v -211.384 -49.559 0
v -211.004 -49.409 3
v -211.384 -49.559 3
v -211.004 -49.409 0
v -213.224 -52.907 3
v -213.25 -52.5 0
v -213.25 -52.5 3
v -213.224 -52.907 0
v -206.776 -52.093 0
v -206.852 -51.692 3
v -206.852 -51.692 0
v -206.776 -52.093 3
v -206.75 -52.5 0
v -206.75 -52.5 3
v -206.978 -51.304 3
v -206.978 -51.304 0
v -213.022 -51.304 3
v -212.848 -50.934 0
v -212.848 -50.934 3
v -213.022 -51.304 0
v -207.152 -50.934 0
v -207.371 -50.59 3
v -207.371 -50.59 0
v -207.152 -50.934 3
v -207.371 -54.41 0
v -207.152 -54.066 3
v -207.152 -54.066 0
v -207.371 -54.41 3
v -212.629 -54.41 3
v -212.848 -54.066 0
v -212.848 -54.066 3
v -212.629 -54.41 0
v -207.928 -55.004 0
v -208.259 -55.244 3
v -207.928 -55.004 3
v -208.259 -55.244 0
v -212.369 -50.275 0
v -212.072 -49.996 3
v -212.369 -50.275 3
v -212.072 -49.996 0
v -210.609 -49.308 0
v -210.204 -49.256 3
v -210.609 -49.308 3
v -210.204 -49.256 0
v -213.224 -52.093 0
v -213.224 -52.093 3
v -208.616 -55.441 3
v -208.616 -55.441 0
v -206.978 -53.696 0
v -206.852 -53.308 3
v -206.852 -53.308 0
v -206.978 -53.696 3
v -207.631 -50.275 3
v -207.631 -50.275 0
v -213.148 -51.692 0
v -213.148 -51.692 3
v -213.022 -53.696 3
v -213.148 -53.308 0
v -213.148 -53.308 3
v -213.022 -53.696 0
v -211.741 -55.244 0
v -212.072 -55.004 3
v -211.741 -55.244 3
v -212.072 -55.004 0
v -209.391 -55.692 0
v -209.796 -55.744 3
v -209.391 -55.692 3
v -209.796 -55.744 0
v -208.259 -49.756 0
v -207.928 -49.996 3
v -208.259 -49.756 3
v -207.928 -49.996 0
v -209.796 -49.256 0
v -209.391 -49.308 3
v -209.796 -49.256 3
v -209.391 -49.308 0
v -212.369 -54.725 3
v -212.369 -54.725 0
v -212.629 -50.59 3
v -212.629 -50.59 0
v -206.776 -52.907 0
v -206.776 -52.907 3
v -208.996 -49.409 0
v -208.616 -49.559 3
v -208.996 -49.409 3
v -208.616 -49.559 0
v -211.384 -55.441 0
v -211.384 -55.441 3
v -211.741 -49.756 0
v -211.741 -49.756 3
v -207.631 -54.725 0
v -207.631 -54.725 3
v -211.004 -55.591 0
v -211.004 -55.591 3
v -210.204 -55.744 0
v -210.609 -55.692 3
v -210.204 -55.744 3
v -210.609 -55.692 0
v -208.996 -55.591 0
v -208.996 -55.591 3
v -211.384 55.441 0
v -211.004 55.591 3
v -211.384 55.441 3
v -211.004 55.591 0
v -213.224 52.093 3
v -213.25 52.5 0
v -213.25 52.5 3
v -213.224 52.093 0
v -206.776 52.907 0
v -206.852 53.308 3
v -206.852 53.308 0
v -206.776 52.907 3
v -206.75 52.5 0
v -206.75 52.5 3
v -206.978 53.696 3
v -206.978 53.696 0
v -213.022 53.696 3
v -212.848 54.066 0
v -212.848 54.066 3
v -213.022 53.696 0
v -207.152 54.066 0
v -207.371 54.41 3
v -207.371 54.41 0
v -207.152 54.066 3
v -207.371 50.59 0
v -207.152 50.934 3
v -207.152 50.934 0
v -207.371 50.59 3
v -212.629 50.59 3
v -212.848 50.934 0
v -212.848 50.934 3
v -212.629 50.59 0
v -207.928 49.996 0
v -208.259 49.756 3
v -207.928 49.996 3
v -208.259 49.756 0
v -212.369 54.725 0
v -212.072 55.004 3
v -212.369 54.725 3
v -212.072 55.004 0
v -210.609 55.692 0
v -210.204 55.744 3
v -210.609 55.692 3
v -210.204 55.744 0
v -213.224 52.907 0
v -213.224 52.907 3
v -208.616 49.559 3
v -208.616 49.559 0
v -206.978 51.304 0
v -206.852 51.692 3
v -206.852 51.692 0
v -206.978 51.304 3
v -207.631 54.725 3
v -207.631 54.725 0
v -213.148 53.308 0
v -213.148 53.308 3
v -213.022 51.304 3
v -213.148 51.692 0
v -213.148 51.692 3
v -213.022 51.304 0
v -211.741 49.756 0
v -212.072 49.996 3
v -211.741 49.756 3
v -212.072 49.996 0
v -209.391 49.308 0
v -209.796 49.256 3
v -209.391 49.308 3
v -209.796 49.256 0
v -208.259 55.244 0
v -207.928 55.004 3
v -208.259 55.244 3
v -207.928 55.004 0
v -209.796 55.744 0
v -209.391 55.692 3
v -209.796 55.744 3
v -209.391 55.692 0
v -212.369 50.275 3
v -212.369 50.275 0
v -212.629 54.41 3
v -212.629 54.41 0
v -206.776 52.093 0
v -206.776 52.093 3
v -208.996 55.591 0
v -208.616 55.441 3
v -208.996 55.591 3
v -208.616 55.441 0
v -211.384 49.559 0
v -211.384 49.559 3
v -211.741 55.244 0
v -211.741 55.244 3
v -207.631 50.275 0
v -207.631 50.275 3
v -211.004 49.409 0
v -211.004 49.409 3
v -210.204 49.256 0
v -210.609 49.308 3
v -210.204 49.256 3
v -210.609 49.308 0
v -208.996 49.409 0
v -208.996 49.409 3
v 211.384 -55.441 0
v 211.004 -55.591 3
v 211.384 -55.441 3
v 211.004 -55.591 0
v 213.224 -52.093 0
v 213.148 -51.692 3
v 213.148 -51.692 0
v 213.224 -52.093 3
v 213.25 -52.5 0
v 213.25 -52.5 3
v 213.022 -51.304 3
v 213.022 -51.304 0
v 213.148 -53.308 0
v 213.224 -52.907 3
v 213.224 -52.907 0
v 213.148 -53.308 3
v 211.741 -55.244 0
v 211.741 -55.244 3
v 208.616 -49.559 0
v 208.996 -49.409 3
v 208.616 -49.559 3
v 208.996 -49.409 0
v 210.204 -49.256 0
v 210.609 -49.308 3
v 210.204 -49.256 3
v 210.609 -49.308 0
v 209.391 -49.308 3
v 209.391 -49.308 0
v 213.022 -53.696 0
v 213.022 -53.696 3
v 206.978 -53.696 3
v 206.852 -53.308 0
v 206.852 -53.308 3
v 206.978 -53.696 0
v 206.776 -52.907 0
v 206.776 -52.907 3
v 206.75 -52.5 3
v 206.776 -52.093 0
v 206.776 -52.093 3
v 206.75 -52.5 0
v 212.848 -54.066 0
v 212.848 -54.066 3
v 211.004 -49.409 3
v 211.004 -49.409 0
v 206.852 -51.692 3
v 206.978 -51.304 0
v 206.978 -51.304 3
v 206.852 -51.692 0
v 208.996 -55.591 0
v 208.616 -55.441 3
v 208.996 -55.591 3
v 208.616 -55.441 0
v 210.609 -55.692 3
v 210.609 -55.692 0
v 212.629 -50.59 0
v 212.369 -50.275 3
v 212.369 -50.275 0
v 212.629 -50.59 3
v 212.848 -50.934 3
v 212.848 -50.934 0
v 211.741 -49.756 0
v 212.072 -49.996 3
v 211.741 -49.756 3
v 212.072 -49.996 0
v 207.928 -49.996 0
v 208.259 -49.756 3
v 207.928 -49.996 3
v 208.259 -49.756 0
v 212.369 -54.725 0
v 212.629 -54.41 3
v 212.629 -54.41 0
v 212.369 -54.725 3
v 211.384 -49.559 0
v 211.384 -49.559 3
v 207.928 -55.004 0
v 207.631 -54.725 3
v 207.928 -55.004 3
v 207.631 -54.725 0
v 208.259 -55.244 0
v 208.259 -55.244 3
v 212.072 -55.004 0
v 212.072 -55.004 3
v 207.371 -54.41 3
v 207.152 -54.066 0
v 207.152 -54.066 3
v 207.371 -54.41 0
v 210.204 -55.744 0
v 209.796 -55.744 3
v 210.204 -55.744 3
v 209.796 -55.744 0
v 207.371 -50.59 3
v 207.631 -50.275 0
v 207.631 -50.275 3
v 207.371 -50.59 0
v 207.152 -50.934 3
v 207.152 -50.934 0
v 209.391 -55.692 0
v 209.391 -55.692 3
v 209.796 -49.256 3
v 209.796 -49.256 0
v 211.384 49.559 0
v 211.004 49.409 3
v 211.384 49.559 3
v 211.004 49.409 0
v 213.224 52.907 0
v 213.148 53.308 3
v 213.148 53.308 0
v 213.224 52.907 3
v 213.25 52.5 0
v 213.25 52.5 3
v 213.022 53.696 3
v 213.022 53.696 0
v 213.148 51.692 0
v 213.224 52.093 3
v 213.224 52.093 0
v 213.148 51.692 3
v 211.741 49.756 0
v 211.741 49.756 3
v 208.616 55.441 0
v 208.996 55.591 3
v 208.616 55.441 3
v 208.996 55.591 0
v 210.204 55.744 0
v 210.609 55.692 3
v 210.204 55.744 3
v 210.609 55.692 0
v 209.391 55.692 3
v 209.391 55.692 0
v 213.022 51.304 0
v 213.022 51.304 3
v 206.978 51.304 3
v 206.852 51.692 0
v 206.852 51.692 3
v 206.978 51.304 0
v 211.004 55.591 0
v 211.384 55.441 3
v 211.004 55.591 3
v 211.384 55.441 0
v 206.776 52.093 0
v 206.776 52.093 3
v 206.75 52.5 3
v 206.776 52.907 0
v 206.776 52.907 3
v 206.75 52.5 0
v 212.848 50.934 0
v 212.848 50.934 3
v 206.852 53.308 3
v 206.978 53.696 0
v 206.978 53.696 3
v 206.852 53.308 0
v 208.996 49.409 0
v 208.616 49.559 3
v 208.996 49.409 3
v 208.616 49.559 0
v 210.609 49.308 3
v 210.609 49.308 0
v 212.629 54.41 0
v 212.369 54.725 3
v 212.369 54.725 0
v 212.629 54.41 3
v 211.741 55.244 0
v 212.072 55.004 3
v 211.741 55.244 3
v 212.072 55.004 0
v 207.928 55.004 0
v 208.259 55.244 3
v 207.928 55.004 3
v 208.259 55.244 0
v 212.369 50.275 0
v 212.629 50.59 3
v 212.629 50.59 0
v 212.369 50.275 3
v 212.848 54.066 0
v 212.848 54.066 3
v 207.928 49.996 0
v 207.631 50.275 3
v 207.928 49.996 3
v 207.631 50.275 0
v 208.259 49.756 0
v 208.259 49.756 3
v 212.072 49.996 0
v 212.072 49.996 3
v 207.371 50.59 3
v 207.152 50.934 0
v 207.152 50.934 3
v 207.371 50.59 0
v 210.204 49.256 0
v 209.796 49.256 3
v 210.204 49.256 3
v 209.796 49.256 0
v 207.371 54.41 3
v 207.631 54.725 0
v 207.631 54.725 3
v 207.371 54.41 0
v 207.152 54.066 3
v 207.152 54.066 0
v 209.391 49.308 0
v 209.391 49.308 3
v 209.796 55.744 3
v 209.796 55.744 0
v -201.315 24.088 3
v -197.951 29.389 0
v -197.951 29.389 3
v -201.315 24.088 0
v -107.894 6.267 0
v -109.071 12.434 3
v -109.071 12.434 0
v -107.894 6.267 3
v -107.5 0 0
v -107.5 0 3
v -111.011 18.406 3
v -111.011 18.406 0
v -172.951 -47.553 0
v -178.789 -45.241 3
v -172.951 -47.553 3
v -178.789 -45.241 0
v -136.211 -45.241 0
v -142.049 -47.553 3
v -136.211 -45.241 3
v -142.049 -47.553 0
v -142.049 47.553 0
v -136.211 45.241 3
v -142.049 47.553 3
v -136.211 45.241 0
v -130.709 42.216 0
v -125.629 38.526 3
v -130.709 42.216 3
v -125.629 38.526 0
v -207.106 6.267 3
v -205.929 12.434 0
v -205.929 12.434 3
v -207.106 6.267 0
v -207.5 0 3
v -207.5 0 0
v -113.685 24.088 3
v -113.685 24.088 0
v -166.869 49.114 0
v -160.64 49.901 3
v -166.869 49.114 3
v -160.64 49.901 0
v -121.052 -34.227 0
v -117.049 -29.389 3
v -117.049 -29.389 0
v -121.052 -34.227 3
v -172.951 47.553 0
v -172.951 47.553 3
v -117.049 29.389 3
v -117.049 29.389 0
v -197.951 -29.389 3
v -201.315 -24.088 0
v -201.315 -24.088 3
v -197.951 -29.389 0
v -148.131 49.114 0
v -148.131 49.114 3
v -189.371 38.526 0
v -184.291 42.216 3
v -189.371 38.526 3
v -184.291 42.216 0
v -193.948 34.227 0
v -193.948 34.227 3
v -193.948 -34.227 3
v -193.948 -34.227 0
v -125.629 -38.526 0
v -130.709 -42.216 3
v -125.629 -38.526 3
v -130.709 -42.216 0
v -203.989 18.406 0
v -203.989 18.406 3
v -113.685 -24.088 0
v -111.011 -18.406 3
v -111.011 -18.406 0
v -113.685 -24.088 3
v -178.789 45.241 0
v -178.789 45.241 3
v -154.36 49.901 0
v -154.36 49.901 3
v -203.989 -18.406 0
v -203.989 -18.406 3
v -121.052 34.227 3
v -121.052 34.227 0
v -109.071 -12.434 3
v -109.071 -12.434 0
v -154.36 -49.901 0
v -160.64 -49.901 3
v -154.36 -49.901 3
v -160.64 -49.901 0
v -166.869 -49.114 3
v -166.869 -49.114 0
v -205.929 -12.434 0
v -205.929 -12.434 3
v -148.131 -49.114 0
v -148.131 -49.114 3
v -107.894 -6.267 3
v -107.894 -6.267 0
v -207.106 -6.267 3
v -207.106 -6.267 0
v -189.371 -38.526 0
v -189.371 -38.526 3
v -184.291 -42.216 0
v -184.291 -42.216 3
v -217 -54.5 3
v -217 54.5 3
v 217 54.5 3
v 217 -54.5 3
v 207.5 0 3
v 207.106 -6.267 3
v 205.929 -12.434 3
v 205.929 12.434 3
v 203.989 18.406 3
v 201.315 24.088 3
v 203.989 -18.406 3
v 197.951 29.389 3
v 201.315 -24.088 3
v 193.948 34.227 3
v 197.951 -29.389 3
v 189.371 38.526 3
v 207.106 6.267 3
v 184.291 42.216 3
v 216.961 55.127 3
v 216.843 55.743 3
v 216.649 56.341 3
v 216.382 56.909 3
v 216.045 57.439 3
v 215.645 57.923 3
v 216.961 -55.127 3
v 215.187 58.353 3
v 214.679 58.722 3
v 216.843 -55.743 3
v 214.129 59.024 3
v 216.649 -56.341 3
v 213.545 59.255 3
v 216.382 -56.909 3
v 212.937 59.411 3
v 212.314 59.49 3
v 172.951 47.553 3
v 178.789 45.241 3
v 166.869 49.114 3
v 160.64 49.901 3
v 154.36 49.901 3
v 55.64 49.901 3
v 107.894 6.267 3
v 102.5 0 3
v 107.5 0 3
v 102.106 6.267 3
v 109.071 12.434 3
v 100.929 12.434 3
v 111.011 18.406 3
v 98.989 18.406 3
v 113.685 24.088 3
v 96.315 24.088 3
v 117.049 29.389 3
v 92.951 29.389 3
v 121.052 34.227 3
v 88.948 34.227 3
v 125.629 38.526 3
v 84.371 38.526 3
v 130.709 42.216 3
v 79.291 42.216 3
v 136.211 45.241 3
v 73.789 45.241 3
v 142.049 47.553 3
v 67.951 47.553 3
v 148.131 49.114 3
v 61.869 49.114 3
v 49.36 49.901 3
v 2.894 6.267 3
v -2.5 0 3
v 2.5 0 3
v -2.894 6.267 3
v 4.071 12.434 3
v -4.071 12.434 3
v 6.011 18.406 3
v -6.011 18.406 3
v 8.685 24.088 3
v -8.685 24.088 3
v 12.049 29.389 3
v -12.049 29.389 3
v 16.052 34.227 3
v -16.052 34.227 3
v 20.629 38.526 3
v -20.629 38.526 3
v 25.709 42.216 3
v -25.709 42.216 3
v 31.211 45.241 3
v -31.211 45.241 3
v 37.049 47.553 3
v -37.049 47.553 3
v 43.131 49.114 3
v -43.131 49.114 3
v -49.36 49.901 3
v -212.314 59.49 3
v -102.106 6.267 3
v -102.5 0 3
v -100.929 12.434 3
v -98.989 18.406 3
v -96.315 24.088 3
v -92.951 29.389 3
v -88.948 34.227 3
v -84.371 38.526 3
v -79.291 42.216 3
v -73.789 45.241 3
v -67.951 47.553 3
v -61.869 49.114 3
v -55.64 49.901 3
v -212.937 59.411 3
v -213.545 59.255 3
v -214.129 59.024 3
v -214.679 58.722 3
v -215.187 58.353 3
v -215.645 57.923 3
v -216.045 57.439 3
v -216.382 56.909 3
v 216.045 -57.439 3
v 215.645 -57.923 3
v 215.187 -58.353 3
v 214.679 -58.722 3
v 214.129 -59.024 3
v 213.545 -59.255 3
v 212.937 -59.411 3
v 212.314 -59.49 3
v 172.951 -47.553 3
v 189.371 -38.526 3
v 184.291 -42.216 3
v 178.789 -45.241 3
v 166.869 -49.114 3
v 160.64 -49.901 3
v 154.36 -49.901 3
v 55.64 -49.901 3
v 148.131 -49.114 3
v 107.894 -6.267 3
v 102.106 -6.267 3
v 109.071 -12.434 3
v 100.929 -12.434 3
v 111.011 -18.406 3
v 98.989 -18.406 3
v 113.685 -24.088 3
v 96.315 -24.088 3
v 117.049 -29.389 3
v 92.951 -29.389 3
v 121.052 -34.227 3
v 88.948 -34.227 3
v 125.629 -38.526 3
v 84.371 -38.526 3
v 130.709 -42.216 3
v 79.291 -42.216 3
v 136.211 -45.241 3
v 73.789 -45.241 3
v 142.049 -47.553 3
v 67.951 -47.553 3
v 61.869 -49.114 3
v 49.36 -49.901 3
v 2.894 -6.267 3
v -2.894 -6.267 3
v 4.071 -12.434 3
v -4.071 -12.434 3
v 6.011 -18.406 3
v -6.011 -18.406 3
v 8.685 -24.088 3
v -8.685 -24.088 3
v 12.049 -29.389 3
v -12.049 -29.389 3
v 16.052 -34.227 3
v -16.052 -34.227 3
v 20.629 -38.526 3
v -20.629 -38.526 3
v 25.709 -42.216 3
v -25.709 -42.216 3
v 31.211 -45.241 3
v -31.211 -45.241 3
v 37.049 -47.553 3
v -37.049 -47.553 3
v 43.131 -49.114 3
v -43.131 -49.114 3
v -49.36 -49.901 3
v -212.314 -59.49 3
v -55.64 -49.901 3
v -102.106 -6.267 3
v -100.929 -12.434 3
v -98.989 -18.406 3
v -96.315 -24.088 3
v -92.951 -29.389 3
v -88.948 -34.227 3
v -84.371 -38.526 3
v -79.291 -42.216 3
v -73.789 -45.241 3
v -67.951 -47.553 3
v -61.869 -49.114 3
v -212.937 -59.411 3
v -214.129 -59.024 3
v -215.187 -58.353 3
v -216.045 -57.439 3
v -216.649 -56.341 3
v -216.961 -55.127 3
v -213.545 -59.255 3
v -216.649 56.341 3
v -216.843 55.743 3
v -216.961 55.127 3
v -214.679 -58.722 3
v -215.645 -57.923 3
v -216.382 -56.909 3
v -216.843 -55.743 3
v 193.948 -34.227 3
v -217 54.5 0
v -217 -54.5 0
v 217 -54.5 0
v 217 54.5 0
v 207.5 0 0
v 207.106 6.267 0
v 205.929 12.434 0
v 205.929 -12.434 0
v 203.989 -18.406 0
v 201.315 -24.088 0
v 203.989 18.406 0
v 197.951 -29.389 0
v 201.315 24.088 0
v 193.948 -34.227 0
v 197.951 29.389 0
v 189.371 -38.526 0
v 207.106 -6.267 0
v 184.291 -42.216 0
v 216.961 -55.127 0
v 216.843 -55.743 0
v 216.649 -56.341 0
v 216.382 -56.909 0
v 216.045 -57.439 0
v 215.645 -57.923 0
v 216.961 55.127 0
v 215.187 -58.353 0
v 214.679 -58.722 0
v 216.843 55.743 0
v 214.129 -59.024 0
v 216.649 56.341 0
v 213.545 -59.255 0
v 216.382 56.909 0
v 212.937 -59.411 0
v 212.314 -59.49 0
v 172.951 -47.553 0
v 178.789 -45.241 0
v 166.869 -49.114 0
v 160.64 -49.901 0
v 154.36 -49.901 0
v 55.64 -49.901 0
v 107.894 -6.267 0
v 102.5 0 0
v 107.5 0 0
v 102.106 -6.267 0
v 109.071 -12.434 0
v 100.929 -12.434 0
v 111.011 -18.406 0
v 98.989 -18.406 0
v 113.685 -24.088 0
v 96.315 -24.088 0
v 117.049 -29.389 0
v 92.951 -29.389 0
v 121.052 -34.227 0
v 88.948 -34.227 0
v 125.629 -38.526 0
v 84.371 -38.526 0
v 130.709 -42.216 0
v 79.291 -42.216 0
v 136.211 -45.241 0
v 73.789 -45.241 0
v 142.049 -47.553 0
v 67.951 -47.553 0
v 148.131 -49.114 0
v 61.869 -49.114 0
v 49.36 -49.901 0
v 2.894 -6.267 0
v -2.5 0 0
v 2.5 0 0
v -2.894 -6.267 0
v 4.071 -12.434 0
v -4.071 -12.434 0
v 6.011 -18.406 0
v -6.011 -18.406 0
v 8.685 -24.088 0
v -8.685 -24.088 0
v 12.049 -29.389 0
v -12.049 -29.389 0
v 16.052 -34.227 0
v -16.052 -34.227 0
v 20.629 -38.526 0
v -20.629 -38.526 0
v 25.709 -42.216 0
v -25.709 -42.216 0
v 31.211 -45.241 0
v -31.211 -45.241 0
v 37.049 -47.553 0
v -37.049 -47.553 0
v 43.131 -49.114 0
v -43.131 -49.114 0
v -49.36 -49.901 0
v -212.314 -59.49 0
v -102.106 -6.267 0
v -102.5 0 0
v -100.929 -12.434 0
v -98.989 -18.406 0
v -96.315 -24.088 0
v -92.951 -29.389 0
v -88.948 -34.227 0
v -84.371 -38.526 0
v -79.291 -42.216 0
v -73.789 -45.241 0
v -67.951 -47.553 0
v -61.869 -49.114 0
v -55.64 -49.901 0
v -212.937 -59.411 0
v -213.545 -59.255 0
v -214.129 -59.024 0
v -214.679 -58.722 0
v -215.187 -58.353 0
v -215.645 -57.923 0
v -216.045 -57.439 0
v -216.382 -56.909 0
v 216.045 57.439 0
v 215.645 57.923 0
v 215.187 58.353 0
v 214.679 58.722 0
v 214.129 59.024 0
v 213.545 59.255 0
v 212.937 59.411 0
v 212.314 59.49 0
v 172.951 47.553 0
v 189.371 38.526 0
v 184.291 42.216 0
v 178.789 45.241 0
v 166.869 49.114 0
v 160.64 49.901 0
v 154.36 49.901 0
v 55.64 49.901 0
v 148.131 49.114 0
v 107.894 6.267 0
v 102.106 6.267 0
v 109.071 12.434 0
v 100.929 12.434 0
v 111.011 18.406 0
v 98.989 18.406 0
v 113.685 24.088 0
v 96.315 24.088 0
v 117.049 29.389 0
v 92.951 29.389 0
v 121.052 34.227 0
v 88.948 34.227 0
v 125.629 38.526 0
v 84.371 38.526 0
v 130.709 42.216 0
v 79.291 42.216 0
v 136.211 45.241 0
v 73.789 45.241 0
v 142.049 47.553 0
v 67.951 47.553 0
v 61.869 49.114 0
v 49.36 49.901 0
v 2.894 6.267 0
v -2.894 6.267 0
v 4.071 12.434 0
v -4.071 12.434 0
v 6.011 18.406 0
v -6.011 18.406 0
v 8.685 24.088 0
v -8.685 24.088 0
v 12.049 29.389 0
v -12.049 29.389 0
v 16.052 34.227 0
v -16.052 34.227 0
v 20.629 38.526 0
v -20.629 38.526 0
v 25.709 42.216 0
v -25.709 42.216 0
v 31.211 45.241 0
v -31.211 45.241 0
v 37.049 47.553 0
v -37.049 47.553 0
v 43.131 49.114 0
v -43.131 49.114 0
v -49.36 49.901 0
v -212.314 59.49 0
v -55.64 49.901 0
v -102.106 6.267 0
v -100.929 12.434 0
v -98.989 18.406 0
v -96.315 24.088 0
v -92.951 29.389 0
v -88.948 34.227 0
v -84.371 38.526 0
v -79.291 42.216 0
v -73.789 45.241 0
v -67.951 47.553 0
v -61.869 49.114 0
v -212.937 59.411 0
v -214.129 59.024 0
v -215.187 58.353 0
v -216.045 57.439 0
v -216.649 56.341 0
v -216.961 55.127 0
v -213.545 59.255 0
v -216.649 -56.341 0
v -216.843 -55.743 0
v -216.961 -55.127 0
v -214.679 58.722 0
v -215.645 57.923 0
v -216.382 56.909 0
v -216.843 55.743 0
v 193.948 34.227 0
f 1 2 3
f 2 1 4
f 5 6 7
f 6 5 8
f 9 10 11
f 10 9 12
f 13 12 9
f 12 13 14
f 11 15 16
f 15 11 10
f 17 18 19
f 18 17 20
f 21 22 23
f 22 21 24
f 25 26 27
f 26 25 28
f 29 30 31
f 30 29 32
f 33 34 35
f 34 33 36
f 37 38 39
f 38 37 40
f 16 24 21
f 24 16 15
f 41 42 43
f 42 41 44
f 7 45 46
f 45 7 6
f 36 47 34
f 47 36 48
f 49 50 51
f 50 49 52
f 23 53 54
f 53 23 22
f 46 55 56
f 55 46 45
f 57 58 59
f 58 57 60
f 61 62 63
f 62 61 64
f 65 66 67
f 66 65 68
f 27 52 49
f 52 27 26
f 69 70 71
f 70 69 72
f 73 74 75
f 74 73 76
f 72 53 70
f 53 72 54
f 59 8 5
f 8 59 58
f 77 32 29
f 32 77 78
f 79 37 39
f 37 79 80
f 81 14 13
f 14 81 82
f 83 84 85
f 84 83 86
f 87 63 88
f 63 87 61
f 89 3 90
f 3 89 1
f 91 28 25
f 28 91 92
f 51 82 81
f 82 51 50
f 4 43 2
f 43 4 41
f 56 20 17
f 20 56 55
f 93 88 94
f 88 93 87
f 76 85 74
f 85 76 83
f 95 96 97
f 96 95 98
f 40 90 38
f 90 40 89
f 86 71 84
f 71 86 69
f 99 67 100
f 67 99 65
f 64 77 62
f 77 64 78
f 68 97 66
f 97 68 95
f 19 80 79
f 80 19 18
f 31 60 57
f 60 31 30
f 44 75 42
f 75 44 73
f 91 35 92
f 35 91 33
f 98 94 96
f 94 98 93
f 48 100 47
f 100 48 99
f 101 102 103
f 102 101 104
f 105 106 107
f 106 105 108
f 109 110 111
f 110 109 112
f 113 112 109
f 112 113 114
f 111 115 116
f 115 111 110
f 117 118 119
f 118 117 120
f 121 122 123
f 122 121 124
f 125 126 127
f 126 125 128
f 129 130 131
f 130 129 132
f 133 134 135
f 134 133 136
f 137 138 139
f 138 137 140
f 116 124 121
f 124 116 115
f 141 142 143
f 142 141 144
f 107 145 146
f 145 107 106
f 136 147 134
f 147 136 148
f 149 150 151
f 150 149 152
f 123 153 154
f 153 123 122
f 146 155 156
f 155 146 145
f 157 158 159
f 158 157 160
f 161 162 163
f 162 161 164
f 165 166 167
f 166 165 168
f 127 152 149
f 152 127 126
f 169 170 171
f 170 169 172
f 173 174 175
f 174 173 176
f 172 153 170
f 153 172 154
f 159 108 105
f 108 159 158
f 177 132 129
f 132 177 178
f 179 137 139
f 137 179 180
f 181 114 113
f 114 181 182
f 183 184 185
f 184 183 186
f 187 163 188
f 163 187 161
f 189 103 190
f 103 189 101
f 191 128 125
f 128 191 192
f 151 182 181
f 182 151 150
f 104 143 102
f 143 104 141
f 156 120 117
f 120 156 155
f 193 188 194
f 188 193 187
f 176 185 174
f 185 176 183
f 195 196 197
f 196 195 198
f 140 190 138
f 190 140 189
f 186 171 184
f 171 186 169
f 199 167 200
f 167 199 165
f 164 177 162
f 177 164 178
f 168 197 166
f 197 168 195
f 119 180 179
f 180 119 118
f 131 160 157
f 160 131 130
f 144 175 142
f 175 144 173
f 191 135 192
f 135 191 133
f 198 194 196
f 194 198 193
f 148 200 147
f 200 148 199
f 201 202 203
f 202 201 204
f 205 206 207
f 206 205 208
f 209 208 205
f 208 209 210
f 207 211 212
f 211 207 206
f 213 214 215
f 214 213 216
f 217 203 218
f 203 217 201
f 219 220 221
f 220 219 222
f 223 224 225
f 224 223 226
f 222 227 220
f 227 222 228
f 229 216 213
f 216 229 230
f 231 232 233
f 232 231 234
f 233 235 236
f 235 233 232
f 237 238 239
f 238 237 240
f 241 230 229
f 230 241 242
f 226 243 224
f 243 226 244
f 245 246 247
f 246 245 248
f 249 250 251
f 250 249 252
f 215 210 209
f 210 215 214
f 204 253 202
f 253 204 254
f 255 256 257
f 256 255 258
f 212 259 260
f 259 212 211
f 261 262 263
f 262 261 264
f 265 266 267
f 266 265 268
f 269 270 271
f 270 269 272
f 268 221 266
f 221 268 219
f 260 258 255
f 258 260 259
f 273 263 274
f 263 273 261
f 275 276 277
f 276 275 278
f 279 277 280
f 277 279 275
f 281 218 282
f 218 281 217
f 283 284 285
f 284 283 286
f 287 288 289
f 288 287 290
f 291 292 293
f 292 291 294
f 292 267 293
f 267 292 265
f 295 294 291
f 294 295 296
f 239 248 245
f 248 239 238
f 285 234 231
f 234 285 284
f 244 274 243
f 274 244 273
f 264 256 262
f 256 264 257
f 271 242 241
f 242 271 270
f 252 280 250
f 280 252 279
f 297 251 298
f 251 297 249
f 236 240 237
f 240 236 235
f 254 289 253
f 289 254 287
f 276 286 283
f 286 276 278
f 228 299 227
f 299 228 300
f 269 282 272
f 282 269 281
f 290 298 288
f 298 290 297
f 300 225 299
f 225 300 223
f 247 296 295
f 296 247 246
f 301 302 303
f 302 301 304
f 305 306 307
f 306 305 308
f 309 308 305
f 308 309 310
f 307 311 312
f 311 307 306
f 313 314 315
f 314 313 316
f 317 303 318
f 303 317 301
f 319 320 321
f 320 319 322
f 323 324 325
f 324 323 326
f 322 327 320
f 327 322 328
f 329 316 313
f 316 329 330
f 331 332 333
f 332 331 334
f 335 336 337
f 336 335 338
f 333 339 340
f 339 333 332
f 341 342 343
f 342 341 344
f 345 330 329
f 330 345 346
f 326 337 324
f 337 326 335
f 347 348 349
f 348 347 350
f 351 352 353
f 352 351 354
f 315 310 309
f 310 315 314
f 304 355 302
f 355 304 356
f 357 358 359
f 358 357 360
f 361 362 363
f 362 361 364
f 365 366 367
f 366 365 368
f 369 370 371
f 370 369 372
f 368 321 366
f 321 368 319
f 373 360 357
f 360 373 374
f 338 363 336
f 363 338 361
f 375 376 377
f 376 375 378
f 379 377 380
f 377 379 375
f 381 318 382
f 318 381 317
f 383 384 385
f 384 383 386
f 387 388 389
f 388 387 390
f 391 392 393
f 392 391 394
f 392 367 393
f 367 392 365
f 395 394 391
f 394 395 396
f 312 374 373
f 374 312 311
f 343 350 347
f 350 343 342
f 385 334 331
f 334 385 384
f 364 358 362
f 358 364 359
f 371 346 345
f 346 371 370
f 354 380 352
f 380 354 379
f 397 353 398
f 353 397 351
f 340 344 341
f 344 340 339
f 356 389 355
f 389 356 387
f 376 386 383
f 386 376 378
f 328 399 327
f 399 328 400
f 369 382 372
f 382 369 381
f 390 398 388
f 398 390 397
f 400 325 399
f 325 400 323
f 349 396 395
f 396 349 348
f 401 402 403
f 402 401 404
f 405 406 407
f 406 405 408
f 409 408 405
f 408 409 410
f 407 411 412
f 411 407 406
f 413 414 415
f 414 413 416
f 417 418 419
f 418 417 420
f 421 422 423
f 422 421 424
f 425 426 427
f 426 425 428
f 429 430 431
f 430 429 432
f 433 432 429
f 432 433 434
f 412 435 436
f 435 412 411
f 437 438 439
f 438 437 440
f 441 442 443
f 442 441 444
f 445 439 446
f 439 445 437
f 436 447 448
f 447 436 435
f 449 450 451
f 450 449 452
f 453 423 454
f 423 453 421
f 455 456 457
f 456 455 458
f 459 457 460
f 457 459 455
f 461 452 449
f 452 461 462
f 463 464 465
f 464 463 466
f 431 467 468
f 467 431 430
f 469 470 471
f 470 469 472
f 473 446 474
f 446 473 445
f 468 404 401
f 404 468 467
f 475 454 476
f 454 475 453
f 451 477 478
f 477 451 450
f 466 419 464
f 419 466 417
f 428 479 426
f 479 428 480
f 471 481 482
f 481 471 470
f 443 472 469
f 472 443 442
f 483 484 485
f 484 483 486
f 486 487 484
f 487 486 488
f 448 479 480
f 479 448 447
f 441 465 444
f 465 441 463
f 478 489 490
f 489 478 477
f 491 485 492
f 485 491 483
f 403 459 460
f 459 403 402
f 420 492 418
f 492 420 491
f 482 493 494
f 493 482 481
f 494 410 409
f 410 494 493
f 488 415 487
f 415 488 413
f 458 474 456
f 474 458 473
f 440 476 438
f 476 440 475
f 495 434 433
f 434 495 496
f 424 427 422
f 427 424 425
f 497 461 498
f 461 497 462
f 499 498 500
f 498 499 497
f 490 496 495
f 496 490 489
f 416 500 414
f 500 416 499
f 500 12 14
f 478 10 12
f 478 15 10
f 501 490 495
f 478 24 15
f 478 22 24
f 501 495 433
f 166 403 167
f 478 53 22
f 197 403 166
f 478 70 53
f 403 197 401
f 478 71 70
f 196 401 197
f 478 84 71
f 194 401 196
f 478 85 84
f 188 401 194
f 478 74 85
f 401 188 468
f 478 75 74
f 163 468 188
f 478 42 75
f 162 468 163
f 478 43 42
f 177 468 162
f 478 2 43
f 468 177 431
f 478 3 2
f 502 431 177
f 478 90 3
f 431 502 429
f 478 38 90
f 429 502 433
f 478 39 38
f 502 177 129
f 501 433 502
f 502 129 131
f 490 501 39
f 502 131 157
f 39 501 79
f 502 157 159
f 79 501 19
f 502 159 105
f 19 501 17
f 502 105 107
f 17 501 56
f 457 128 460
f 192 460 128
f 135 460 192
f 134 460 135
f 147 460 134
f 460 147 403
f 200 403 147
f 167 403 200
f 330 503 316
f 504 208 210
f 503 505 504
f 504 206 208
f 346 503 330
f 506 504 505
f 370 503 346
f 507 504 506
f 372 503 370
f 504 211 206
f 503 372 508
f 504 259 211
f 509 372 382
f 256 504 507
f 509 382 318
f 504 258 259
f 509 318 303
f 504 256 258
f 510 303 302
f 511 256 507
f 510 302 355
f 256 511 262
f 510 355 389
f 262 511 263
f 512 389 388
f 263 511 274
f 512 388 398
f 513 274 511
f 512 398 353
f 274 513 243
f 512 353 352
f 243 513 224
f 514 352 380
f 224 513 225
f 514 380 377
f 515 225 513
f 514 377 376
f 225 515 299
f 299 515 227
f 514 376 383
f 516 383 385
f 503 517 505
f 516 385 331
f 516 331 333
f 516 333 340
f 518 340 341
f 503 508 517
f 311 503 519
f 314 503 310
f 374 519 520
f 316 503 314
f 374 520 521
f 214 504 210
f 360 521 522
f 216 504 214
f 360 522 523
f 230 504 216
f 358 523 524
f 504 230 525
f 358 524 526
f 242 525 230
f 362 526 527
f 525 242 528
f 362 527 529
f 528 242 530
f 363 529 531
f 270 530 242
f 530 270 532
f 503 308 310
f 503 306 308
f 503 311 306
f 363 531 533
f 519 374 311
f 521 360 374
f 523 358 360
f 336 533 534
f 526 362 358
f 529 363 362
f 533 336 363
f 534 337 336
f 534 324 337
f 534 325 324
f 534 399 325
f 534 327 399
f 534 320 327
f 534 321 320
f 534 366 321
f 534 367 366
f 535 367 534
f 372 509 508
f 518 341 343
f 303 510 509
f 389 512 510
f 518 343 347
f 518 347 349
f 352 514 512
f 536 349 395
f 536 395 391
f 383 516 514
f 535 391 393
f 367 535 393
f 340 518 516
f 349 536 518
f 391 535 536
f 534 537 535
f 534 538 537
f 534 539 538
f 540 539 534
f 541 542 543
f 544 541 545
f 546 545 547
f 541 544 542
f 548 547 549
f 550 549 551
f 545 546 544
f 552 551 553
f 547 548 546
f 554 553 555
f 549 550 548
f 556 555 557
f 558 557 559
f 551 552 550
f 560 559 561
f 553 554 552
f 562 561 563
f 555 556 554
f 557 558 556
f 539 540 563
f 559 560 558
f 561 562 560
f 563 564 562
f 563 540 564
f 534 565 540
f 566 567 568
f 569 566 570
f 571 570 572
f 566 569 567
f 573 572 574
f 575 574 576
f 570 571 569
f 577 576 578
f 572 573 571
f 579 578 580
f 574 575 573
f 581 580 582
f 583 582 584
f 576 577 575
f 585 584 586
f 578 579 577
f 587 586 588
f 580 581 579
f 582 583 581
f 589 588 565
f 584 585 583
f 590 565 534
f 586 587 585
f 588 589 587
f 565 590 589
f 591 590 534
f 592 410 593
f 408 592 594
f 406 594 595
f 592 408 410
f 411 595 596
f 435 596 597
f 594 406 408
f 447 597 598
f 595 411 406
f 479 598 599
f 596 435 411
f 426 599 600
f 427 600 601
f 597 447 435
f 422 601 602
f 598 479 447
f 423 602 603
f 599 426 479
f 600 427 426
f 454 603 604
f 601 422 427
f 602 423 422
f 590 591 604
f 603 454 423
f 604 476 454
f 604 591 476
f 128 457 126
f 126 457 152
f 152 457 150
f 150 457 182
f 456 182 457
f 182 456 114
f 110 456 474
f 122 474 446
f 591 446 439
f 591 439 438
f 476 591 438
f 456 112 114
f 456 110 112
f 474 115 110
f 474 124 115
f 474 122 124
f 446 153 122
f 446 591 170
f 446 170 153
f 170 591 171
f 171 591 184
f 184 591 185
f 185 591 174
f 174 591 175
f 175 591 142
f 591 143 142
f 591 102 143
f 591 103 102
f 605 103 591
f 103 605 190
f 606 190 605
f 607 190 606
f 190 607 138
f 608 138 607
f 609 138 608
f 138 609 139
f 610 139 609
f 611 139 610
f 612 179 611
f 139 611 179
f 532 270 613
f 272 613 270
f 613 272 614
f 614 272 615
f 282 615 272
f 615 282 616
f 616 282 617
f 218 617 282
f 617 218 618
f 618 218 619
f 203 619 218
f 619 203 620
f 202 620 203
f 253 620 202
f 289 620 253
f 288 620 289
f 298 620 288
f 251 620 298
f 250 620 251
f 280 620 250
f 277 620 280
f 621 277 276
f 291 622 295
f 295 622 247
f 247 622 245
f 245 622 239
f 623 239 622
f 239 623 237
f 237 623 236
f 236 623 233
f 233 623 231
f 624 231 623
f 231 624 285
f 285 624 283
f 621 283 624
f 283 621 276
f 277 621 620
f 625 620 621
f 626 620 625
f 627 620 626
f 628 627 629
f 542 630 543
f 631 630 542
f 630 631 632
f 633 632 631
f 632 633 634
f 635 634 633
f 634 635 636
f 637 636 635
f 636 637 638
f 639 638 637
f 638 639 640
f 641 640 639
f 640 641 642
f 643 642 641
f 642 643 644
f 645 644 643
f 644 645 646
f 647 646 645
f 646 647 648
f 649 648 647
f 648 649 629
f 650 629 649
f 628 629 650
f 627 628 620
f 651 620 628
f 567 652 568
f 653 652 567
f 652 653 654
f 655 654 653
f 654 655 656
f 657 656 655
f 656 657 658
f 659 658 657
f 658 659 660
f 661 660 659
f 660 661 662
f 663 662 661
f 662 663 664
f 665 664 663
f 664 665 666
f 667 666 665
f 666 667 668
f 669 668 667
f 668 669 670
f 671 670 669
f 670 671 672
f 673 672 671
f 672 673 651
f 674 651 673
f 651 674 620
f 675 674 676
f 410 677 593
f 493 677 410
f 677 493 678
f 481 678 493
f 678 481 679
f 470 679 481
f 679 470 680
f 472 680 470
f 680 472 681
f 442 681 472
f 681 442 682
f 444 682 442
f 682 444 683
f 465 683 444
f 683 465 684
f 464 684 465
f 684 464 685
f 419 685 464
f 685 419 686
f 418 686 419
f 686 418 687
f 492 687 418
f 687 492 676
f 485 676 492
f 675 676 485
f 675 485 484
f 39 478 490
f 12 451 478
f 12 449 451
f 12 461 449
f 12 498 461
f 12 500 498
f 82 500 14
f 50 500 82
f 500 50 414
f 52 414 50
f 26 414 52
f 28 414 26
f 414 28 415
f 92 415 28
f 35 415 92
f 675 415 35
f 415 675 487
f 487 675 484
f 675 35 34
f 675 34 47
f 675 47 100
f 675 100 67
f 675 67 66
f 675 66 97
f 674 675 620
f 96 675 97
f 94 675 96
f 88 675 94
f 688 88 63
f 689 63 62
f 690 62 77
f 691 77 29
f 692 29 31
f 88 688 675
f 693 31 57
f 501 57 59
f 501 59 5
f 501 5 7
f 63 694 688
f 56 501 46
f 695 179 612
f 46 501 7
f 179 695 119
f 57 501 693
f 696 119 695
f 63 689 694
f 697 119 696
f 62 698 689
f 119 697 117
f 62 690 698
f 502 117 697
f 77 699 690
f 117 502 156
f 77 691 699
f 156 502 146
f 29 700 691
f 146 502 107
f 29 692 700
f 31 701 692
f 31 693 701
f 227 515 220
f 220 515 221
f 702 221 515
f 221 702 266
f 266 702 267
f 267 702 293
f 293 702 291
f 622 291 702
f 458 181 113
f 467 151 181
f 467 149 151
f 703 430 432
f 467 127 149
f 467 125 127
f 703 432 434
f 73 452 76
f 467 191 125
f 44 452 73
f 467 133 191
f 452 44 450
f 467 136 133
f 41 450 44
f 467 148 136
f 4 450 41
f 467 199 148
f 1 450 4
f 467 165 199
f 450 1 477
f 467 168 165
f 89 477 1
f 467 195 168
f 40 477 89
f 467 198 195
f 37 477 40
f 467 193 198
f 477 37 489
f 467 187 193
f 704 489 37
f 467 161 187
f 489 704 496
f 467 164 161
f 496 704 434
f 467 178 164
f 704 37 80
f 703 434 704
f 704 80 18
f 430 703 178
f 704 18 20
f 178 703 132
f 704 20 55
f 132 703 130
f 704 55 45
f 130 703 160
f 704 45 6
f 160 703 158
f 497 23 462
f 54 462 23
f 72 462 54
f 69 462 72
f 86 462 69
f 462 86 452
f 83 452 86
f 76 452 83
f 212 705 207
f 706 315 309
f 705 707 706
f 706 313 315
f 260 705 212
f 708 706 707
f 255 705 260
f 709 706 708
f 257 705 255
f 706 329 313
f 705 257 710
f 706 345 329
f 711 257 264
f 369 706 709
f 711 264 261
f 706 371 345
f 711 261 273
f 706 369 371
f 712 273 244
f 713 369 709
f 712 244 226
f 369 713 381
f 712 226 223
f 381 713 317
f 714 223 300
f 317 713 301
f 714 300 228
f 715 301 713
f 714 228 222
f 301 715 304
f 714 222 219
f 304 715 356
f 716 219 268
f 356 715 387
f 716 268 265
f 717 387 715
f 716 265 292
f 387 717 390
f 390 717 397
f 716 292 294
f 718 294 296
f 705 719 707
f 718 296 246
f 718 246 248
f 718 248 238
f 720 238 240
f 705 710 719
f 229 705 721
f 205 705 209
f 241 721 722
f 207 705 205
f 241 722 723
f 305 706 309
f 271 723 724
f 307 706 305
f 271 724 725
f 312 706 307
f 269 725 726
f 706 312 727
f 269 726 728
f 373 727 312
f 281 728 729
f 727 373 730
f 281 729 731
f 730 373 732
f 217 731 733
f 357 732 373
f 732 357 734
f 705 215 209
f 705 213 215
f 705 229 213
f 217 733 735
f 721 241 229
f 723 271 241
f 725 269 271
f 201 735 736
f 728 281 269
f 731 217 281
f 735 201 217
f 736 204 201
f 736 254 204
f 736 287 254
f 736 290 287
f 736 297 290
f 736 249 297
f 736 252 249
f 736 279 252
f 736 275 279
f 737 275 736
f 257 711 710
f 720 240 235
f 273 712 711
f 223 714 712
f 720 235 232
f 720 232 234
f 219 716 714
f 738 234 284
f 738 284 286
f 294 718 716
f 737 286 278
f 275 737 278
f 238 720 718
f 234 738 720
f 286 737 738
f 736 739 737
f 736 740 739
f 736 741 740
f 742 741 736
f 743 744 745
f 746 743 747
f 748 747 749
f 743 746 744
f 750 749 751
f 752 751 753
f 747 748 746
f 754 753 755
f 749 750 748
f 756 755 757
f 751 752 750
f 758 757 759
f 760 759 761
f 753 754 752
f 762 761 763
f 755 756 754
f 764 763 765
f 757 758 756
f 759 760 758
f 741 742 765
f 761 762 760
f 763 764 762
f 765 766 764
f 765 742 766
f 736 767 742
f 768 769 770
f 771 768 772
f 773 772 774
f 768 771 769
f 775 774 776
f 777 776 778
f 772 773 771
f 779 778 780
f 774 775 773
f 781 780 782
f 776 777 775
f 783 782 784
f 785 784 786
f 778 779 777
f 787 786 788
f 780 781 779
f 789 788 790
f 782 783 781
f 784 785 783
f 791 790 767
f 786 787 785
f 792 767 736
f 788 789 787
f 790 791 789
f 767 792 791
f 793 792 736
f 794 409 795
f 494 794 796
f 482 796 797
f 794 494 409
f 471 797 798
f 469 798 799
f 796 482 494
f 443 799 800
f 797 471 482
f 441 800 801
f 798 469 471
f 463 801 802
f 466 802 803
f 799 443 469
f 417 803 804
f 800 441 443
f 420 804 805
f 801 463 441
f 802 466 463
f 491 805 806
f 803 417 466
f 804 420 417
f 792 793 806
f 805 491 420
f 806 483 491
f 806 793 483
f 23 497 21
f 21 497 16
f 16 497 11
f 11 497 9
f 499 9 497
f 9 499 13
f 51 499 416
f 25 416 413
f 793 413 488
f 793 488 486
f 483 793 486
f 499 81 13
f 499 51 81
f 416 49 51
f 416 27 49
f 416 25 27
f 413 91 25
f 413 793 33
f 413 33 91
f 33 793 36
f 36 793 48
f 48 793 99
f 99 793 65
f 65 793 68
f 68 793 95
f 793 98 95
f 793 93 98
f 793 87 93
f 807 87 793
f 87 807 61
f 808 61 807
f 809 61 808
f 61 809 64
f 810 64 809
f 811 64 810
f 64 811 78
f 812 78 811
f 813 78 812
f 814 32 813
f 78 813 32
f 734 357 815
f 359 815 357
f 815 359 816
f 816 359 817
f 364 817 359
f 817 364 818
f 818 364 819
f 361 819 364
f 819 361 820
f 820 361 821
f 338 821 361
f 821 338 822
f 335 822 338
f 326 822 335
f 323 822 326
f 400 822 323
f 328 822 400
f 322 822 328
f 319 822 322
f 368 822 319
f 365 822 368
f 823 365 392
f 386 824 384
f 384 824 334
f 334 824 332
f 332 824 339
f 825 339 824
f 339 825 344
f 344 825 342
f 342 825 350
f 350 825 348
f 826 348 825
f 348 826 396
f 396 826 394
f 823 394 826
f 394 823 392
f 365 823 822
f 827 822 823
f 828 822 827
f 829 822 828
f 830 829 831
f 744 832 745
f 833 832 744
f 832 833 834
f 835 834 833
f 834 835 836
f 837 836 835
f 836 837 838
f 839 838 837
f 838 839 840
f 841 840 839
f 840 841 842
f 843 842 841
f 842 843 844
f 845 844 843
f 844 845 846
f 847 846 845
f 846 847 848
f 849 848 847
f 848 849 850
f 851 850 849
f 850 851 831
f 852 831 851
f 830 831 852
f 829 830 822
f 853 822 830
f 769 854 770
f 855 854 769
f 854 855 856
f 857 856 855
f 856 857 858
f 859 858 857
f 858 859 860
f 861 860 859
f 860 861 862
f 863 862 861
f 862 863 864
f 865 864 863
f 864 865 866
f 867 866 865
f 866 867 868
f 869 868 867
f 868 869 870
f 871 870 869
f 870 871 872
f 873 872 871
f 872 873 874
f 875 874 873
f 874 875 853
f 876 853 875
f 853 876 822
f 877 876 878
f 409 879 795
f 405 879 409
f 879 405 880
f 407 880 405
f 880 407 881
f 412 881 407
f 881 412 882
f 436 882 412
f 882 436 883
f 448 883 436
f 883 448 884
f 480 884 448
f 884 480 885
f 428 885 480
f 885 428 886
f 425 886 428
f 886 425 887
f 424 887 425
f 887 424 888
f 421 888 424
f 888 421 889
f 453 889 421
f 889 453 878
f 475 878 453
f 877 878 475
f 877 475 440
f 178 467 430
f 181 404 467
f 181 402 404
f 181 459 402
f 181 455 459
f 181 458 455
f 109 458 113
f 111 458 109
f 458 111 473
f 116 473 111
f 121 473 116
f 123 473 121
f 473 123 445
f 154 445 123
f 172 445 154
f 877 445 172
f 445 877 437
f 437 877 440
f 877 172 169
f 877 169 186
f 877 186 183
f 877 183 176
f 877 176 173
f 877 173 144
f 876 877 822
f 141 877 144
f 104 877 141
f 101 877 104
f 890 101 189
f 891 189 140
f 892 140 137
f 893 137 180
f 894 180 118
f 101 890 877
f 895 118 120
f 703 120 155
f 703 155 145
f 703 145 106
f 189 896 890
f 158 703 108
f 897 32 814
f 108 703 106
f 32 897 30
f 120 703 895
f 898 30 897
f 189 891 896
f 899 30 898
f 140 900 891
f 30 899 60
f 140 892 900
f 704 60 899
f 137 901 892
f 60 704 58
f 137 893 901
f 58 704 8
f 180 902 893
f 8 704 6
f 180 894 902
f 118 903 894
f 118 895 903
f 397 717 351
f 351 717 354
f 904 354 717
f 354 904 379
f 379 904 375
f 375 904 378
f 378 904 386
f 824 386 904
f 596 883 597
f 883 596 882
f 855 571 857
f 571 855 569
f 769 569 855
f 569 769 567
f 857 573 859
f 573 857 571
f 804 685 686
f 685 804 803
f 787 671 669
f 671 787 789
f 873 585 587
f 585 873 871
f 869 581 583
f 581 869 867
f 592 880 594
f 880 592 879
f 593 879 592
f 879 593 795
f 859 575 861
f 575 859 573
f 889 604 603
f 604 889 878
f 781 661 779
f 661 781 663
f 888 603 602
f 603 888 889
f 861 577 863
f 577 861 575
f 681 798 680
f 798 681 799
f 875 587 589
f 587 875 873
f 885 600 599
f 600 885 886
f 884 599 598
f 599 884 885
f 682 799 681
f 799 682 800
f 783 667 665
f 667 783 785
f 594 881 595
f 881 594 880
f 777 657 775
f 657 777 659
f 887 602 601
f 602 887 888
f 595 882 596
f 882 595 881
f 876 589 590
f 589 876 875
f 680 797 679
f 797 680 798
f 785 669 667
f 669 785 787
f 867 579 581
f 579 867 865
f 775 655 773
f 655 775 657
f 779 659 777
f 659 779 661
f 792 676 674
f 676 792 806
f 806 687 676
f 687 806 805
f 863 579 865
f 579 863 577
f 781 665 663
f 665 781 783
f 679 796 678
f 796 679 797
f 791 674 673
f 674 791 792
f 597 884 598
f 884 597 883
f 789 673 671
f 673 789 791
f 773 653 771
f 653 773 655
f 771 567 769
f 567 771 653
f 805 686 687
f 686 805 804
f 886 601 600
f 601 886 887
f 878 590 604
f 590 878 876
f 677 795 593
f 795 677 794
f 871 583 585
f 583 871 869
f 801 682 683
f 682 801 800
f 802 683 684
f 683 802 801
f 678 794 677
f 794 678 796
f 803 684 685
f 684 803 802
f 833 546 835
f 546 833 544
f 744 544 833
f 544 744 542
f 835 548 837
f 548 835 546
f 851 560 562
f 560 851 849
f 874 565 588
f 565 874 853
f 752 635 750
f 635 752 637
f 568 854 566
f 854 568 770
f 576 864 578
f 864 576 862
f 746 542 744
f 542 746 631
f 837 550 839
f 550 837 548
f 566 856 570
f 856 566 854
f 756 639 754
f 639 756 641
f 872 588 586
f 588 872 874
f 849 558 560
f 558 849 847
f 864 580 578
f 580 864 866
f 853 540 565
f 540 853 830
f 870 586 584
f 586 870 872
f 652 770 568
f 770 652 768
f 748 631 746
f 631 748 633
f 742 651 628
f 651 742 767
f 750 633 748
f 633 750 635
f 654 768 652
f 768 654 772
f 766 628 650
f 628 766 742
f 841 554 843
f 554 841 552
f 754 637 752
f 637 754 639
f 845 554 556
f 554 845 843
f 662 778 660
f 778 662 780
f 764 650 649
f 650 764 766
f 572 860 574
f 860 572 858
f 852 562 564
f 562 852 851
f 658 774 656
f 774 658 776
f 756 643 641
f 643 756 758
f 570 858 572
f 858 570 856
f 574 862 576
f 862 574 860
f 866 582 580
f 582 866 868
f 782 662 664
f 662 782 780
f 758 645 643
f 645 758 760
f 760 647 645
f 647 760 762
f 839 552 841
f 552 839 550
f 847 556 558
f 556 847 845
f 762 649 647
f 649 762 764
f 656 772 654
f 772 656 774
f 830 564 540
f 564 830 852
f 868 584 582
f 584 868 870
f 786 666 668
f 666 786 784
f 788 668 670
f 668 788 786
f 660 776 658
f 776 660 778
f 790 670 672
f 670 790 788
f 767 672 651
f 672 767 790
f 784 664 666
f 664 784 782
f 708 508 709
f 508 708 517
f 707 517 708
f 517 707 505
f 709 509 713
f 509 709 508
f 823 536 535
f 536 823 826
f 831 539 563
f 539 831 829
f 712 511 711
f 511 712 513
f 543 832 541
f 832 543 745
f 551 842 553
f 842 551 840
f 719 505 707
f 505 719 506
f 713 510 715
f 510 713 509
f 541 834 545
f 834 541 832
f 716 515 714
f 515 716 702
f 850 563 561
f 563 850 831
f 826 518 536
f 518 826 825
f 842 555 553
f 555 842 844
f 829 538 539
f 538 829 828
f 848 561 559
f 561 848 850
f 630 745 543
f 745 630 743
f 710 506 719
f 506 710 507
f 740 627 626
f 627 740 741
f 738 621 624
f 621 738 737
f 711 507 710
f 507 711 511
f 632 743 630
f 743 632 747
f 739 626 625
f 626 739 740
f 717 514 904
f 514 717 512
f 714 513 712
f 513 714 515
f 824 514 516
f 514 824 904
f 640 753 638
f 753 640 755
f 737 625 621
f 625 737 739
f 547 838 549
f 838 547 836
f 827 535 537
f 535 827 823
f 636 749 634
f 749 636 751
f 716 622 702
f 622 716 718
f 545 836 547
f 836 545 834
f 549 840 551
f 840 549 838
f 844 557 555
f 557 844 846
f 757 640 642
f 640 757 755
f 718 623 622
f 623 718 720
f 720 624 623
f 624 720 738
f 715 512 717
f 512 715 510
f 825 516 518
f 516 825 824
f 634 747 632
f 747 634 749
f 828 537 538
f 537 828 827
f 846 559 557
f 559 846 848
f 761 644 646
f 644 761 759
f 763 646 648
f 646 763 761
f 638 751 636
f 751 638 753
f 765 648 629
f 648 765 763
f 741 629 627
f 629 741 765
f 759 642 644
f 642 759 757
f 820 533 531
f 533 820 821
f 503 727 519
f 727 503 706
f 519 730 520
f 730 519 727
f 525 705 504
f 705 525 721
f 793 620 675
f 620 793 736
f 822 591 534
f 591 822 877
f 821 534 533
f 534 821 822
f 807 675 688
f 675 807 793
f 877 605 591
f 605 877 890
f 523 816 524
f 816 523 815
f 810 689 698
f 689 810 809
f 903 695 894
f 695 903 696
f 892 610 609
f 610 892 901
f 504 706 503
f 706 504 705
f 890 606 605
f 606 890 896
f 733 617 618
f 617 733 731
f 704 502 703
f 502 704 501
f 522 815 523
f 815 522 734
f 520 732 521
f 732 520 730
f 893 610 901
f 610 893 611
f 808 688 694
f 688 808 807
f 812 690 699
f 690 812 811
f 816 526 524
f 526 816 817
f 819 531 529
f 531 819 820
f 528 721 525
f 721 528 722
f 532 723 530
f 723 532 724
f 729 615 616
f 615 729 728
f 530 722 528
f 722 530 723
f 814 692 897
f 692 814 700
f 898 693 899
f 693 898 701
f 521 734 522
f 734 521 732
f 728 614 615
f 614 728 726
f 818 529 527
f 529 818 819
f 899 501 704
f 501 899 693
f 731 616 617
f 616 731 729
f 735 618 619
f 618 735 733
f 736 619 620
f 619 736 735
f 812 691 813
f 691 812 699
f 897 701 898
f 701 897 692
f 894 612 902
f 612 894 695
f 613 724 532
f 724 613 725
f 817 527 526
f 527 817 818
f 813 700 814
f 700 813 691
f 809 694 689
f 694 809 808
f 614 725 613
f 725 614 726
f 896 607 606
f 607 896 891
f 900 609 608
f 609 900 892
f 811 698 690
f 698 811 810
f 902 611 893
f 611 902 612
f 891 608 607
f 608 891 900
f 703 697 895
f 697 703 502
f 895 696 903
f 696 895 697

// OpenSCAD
$fn = 50;


difference() {
	union() {
		hull() {
			translate(v = [-212.0000000000, 54.5000000000, 0]) {
				cylinder(h = 3, r = 5);
			}
			translate(v = [212.0000000000, 54.5000000000, 0]) {
				cylinder(h = 3, r = 5);
			}
			translate(v = [-212.0000000000, -54.5000000000, 0]) {
				cylinder(h = 3, r = 5);
			}
			translate(v = [212.0000000000, -54.5000000000, 0]) {
				cylinder(h = 3, r = 5);
			}
		}
	}
	union() {
		#translate(v = [-210.0000000000, -52.5000000000, -100.0000000000]) {
			cylinder(h = 200, r = 3.2500000000);
		}
		#translate(v = [-210.0000000000, 52.5000000000, -100.0000000000]) {
			cylinder(h = 200, r = 3.2500000000);
		}
		#translate(v = [210.0000000000, -52.5000000000, -100.0000000000]) {
			cylinder(h = 200, r = 3.2500000000);
		}
		#translate(v = [210.0000000000, 52.5000000000, -100.0000000000]) {
			cylinder(h = 200, r = 3.2500000000);
		}
		#translate(v = [-157.5000000000, 0, 0]) {
			cylinder(h = 3, r = 50.0000000000);
		}
		#translate(v = [-52.5000000000, 0, 0]) {
			cylinder(h = 3, r = 50.0000000000);
		}
		#translate(v = [52.5000000000, 0, 0]) {
			cylinder(h = 3, r = 50.0000000000);
		}
		#translate(v = [157.5000000000, 0, 0]) {
			cylinder(h = 3, r = 50.0000000000);
		}
	}
}
